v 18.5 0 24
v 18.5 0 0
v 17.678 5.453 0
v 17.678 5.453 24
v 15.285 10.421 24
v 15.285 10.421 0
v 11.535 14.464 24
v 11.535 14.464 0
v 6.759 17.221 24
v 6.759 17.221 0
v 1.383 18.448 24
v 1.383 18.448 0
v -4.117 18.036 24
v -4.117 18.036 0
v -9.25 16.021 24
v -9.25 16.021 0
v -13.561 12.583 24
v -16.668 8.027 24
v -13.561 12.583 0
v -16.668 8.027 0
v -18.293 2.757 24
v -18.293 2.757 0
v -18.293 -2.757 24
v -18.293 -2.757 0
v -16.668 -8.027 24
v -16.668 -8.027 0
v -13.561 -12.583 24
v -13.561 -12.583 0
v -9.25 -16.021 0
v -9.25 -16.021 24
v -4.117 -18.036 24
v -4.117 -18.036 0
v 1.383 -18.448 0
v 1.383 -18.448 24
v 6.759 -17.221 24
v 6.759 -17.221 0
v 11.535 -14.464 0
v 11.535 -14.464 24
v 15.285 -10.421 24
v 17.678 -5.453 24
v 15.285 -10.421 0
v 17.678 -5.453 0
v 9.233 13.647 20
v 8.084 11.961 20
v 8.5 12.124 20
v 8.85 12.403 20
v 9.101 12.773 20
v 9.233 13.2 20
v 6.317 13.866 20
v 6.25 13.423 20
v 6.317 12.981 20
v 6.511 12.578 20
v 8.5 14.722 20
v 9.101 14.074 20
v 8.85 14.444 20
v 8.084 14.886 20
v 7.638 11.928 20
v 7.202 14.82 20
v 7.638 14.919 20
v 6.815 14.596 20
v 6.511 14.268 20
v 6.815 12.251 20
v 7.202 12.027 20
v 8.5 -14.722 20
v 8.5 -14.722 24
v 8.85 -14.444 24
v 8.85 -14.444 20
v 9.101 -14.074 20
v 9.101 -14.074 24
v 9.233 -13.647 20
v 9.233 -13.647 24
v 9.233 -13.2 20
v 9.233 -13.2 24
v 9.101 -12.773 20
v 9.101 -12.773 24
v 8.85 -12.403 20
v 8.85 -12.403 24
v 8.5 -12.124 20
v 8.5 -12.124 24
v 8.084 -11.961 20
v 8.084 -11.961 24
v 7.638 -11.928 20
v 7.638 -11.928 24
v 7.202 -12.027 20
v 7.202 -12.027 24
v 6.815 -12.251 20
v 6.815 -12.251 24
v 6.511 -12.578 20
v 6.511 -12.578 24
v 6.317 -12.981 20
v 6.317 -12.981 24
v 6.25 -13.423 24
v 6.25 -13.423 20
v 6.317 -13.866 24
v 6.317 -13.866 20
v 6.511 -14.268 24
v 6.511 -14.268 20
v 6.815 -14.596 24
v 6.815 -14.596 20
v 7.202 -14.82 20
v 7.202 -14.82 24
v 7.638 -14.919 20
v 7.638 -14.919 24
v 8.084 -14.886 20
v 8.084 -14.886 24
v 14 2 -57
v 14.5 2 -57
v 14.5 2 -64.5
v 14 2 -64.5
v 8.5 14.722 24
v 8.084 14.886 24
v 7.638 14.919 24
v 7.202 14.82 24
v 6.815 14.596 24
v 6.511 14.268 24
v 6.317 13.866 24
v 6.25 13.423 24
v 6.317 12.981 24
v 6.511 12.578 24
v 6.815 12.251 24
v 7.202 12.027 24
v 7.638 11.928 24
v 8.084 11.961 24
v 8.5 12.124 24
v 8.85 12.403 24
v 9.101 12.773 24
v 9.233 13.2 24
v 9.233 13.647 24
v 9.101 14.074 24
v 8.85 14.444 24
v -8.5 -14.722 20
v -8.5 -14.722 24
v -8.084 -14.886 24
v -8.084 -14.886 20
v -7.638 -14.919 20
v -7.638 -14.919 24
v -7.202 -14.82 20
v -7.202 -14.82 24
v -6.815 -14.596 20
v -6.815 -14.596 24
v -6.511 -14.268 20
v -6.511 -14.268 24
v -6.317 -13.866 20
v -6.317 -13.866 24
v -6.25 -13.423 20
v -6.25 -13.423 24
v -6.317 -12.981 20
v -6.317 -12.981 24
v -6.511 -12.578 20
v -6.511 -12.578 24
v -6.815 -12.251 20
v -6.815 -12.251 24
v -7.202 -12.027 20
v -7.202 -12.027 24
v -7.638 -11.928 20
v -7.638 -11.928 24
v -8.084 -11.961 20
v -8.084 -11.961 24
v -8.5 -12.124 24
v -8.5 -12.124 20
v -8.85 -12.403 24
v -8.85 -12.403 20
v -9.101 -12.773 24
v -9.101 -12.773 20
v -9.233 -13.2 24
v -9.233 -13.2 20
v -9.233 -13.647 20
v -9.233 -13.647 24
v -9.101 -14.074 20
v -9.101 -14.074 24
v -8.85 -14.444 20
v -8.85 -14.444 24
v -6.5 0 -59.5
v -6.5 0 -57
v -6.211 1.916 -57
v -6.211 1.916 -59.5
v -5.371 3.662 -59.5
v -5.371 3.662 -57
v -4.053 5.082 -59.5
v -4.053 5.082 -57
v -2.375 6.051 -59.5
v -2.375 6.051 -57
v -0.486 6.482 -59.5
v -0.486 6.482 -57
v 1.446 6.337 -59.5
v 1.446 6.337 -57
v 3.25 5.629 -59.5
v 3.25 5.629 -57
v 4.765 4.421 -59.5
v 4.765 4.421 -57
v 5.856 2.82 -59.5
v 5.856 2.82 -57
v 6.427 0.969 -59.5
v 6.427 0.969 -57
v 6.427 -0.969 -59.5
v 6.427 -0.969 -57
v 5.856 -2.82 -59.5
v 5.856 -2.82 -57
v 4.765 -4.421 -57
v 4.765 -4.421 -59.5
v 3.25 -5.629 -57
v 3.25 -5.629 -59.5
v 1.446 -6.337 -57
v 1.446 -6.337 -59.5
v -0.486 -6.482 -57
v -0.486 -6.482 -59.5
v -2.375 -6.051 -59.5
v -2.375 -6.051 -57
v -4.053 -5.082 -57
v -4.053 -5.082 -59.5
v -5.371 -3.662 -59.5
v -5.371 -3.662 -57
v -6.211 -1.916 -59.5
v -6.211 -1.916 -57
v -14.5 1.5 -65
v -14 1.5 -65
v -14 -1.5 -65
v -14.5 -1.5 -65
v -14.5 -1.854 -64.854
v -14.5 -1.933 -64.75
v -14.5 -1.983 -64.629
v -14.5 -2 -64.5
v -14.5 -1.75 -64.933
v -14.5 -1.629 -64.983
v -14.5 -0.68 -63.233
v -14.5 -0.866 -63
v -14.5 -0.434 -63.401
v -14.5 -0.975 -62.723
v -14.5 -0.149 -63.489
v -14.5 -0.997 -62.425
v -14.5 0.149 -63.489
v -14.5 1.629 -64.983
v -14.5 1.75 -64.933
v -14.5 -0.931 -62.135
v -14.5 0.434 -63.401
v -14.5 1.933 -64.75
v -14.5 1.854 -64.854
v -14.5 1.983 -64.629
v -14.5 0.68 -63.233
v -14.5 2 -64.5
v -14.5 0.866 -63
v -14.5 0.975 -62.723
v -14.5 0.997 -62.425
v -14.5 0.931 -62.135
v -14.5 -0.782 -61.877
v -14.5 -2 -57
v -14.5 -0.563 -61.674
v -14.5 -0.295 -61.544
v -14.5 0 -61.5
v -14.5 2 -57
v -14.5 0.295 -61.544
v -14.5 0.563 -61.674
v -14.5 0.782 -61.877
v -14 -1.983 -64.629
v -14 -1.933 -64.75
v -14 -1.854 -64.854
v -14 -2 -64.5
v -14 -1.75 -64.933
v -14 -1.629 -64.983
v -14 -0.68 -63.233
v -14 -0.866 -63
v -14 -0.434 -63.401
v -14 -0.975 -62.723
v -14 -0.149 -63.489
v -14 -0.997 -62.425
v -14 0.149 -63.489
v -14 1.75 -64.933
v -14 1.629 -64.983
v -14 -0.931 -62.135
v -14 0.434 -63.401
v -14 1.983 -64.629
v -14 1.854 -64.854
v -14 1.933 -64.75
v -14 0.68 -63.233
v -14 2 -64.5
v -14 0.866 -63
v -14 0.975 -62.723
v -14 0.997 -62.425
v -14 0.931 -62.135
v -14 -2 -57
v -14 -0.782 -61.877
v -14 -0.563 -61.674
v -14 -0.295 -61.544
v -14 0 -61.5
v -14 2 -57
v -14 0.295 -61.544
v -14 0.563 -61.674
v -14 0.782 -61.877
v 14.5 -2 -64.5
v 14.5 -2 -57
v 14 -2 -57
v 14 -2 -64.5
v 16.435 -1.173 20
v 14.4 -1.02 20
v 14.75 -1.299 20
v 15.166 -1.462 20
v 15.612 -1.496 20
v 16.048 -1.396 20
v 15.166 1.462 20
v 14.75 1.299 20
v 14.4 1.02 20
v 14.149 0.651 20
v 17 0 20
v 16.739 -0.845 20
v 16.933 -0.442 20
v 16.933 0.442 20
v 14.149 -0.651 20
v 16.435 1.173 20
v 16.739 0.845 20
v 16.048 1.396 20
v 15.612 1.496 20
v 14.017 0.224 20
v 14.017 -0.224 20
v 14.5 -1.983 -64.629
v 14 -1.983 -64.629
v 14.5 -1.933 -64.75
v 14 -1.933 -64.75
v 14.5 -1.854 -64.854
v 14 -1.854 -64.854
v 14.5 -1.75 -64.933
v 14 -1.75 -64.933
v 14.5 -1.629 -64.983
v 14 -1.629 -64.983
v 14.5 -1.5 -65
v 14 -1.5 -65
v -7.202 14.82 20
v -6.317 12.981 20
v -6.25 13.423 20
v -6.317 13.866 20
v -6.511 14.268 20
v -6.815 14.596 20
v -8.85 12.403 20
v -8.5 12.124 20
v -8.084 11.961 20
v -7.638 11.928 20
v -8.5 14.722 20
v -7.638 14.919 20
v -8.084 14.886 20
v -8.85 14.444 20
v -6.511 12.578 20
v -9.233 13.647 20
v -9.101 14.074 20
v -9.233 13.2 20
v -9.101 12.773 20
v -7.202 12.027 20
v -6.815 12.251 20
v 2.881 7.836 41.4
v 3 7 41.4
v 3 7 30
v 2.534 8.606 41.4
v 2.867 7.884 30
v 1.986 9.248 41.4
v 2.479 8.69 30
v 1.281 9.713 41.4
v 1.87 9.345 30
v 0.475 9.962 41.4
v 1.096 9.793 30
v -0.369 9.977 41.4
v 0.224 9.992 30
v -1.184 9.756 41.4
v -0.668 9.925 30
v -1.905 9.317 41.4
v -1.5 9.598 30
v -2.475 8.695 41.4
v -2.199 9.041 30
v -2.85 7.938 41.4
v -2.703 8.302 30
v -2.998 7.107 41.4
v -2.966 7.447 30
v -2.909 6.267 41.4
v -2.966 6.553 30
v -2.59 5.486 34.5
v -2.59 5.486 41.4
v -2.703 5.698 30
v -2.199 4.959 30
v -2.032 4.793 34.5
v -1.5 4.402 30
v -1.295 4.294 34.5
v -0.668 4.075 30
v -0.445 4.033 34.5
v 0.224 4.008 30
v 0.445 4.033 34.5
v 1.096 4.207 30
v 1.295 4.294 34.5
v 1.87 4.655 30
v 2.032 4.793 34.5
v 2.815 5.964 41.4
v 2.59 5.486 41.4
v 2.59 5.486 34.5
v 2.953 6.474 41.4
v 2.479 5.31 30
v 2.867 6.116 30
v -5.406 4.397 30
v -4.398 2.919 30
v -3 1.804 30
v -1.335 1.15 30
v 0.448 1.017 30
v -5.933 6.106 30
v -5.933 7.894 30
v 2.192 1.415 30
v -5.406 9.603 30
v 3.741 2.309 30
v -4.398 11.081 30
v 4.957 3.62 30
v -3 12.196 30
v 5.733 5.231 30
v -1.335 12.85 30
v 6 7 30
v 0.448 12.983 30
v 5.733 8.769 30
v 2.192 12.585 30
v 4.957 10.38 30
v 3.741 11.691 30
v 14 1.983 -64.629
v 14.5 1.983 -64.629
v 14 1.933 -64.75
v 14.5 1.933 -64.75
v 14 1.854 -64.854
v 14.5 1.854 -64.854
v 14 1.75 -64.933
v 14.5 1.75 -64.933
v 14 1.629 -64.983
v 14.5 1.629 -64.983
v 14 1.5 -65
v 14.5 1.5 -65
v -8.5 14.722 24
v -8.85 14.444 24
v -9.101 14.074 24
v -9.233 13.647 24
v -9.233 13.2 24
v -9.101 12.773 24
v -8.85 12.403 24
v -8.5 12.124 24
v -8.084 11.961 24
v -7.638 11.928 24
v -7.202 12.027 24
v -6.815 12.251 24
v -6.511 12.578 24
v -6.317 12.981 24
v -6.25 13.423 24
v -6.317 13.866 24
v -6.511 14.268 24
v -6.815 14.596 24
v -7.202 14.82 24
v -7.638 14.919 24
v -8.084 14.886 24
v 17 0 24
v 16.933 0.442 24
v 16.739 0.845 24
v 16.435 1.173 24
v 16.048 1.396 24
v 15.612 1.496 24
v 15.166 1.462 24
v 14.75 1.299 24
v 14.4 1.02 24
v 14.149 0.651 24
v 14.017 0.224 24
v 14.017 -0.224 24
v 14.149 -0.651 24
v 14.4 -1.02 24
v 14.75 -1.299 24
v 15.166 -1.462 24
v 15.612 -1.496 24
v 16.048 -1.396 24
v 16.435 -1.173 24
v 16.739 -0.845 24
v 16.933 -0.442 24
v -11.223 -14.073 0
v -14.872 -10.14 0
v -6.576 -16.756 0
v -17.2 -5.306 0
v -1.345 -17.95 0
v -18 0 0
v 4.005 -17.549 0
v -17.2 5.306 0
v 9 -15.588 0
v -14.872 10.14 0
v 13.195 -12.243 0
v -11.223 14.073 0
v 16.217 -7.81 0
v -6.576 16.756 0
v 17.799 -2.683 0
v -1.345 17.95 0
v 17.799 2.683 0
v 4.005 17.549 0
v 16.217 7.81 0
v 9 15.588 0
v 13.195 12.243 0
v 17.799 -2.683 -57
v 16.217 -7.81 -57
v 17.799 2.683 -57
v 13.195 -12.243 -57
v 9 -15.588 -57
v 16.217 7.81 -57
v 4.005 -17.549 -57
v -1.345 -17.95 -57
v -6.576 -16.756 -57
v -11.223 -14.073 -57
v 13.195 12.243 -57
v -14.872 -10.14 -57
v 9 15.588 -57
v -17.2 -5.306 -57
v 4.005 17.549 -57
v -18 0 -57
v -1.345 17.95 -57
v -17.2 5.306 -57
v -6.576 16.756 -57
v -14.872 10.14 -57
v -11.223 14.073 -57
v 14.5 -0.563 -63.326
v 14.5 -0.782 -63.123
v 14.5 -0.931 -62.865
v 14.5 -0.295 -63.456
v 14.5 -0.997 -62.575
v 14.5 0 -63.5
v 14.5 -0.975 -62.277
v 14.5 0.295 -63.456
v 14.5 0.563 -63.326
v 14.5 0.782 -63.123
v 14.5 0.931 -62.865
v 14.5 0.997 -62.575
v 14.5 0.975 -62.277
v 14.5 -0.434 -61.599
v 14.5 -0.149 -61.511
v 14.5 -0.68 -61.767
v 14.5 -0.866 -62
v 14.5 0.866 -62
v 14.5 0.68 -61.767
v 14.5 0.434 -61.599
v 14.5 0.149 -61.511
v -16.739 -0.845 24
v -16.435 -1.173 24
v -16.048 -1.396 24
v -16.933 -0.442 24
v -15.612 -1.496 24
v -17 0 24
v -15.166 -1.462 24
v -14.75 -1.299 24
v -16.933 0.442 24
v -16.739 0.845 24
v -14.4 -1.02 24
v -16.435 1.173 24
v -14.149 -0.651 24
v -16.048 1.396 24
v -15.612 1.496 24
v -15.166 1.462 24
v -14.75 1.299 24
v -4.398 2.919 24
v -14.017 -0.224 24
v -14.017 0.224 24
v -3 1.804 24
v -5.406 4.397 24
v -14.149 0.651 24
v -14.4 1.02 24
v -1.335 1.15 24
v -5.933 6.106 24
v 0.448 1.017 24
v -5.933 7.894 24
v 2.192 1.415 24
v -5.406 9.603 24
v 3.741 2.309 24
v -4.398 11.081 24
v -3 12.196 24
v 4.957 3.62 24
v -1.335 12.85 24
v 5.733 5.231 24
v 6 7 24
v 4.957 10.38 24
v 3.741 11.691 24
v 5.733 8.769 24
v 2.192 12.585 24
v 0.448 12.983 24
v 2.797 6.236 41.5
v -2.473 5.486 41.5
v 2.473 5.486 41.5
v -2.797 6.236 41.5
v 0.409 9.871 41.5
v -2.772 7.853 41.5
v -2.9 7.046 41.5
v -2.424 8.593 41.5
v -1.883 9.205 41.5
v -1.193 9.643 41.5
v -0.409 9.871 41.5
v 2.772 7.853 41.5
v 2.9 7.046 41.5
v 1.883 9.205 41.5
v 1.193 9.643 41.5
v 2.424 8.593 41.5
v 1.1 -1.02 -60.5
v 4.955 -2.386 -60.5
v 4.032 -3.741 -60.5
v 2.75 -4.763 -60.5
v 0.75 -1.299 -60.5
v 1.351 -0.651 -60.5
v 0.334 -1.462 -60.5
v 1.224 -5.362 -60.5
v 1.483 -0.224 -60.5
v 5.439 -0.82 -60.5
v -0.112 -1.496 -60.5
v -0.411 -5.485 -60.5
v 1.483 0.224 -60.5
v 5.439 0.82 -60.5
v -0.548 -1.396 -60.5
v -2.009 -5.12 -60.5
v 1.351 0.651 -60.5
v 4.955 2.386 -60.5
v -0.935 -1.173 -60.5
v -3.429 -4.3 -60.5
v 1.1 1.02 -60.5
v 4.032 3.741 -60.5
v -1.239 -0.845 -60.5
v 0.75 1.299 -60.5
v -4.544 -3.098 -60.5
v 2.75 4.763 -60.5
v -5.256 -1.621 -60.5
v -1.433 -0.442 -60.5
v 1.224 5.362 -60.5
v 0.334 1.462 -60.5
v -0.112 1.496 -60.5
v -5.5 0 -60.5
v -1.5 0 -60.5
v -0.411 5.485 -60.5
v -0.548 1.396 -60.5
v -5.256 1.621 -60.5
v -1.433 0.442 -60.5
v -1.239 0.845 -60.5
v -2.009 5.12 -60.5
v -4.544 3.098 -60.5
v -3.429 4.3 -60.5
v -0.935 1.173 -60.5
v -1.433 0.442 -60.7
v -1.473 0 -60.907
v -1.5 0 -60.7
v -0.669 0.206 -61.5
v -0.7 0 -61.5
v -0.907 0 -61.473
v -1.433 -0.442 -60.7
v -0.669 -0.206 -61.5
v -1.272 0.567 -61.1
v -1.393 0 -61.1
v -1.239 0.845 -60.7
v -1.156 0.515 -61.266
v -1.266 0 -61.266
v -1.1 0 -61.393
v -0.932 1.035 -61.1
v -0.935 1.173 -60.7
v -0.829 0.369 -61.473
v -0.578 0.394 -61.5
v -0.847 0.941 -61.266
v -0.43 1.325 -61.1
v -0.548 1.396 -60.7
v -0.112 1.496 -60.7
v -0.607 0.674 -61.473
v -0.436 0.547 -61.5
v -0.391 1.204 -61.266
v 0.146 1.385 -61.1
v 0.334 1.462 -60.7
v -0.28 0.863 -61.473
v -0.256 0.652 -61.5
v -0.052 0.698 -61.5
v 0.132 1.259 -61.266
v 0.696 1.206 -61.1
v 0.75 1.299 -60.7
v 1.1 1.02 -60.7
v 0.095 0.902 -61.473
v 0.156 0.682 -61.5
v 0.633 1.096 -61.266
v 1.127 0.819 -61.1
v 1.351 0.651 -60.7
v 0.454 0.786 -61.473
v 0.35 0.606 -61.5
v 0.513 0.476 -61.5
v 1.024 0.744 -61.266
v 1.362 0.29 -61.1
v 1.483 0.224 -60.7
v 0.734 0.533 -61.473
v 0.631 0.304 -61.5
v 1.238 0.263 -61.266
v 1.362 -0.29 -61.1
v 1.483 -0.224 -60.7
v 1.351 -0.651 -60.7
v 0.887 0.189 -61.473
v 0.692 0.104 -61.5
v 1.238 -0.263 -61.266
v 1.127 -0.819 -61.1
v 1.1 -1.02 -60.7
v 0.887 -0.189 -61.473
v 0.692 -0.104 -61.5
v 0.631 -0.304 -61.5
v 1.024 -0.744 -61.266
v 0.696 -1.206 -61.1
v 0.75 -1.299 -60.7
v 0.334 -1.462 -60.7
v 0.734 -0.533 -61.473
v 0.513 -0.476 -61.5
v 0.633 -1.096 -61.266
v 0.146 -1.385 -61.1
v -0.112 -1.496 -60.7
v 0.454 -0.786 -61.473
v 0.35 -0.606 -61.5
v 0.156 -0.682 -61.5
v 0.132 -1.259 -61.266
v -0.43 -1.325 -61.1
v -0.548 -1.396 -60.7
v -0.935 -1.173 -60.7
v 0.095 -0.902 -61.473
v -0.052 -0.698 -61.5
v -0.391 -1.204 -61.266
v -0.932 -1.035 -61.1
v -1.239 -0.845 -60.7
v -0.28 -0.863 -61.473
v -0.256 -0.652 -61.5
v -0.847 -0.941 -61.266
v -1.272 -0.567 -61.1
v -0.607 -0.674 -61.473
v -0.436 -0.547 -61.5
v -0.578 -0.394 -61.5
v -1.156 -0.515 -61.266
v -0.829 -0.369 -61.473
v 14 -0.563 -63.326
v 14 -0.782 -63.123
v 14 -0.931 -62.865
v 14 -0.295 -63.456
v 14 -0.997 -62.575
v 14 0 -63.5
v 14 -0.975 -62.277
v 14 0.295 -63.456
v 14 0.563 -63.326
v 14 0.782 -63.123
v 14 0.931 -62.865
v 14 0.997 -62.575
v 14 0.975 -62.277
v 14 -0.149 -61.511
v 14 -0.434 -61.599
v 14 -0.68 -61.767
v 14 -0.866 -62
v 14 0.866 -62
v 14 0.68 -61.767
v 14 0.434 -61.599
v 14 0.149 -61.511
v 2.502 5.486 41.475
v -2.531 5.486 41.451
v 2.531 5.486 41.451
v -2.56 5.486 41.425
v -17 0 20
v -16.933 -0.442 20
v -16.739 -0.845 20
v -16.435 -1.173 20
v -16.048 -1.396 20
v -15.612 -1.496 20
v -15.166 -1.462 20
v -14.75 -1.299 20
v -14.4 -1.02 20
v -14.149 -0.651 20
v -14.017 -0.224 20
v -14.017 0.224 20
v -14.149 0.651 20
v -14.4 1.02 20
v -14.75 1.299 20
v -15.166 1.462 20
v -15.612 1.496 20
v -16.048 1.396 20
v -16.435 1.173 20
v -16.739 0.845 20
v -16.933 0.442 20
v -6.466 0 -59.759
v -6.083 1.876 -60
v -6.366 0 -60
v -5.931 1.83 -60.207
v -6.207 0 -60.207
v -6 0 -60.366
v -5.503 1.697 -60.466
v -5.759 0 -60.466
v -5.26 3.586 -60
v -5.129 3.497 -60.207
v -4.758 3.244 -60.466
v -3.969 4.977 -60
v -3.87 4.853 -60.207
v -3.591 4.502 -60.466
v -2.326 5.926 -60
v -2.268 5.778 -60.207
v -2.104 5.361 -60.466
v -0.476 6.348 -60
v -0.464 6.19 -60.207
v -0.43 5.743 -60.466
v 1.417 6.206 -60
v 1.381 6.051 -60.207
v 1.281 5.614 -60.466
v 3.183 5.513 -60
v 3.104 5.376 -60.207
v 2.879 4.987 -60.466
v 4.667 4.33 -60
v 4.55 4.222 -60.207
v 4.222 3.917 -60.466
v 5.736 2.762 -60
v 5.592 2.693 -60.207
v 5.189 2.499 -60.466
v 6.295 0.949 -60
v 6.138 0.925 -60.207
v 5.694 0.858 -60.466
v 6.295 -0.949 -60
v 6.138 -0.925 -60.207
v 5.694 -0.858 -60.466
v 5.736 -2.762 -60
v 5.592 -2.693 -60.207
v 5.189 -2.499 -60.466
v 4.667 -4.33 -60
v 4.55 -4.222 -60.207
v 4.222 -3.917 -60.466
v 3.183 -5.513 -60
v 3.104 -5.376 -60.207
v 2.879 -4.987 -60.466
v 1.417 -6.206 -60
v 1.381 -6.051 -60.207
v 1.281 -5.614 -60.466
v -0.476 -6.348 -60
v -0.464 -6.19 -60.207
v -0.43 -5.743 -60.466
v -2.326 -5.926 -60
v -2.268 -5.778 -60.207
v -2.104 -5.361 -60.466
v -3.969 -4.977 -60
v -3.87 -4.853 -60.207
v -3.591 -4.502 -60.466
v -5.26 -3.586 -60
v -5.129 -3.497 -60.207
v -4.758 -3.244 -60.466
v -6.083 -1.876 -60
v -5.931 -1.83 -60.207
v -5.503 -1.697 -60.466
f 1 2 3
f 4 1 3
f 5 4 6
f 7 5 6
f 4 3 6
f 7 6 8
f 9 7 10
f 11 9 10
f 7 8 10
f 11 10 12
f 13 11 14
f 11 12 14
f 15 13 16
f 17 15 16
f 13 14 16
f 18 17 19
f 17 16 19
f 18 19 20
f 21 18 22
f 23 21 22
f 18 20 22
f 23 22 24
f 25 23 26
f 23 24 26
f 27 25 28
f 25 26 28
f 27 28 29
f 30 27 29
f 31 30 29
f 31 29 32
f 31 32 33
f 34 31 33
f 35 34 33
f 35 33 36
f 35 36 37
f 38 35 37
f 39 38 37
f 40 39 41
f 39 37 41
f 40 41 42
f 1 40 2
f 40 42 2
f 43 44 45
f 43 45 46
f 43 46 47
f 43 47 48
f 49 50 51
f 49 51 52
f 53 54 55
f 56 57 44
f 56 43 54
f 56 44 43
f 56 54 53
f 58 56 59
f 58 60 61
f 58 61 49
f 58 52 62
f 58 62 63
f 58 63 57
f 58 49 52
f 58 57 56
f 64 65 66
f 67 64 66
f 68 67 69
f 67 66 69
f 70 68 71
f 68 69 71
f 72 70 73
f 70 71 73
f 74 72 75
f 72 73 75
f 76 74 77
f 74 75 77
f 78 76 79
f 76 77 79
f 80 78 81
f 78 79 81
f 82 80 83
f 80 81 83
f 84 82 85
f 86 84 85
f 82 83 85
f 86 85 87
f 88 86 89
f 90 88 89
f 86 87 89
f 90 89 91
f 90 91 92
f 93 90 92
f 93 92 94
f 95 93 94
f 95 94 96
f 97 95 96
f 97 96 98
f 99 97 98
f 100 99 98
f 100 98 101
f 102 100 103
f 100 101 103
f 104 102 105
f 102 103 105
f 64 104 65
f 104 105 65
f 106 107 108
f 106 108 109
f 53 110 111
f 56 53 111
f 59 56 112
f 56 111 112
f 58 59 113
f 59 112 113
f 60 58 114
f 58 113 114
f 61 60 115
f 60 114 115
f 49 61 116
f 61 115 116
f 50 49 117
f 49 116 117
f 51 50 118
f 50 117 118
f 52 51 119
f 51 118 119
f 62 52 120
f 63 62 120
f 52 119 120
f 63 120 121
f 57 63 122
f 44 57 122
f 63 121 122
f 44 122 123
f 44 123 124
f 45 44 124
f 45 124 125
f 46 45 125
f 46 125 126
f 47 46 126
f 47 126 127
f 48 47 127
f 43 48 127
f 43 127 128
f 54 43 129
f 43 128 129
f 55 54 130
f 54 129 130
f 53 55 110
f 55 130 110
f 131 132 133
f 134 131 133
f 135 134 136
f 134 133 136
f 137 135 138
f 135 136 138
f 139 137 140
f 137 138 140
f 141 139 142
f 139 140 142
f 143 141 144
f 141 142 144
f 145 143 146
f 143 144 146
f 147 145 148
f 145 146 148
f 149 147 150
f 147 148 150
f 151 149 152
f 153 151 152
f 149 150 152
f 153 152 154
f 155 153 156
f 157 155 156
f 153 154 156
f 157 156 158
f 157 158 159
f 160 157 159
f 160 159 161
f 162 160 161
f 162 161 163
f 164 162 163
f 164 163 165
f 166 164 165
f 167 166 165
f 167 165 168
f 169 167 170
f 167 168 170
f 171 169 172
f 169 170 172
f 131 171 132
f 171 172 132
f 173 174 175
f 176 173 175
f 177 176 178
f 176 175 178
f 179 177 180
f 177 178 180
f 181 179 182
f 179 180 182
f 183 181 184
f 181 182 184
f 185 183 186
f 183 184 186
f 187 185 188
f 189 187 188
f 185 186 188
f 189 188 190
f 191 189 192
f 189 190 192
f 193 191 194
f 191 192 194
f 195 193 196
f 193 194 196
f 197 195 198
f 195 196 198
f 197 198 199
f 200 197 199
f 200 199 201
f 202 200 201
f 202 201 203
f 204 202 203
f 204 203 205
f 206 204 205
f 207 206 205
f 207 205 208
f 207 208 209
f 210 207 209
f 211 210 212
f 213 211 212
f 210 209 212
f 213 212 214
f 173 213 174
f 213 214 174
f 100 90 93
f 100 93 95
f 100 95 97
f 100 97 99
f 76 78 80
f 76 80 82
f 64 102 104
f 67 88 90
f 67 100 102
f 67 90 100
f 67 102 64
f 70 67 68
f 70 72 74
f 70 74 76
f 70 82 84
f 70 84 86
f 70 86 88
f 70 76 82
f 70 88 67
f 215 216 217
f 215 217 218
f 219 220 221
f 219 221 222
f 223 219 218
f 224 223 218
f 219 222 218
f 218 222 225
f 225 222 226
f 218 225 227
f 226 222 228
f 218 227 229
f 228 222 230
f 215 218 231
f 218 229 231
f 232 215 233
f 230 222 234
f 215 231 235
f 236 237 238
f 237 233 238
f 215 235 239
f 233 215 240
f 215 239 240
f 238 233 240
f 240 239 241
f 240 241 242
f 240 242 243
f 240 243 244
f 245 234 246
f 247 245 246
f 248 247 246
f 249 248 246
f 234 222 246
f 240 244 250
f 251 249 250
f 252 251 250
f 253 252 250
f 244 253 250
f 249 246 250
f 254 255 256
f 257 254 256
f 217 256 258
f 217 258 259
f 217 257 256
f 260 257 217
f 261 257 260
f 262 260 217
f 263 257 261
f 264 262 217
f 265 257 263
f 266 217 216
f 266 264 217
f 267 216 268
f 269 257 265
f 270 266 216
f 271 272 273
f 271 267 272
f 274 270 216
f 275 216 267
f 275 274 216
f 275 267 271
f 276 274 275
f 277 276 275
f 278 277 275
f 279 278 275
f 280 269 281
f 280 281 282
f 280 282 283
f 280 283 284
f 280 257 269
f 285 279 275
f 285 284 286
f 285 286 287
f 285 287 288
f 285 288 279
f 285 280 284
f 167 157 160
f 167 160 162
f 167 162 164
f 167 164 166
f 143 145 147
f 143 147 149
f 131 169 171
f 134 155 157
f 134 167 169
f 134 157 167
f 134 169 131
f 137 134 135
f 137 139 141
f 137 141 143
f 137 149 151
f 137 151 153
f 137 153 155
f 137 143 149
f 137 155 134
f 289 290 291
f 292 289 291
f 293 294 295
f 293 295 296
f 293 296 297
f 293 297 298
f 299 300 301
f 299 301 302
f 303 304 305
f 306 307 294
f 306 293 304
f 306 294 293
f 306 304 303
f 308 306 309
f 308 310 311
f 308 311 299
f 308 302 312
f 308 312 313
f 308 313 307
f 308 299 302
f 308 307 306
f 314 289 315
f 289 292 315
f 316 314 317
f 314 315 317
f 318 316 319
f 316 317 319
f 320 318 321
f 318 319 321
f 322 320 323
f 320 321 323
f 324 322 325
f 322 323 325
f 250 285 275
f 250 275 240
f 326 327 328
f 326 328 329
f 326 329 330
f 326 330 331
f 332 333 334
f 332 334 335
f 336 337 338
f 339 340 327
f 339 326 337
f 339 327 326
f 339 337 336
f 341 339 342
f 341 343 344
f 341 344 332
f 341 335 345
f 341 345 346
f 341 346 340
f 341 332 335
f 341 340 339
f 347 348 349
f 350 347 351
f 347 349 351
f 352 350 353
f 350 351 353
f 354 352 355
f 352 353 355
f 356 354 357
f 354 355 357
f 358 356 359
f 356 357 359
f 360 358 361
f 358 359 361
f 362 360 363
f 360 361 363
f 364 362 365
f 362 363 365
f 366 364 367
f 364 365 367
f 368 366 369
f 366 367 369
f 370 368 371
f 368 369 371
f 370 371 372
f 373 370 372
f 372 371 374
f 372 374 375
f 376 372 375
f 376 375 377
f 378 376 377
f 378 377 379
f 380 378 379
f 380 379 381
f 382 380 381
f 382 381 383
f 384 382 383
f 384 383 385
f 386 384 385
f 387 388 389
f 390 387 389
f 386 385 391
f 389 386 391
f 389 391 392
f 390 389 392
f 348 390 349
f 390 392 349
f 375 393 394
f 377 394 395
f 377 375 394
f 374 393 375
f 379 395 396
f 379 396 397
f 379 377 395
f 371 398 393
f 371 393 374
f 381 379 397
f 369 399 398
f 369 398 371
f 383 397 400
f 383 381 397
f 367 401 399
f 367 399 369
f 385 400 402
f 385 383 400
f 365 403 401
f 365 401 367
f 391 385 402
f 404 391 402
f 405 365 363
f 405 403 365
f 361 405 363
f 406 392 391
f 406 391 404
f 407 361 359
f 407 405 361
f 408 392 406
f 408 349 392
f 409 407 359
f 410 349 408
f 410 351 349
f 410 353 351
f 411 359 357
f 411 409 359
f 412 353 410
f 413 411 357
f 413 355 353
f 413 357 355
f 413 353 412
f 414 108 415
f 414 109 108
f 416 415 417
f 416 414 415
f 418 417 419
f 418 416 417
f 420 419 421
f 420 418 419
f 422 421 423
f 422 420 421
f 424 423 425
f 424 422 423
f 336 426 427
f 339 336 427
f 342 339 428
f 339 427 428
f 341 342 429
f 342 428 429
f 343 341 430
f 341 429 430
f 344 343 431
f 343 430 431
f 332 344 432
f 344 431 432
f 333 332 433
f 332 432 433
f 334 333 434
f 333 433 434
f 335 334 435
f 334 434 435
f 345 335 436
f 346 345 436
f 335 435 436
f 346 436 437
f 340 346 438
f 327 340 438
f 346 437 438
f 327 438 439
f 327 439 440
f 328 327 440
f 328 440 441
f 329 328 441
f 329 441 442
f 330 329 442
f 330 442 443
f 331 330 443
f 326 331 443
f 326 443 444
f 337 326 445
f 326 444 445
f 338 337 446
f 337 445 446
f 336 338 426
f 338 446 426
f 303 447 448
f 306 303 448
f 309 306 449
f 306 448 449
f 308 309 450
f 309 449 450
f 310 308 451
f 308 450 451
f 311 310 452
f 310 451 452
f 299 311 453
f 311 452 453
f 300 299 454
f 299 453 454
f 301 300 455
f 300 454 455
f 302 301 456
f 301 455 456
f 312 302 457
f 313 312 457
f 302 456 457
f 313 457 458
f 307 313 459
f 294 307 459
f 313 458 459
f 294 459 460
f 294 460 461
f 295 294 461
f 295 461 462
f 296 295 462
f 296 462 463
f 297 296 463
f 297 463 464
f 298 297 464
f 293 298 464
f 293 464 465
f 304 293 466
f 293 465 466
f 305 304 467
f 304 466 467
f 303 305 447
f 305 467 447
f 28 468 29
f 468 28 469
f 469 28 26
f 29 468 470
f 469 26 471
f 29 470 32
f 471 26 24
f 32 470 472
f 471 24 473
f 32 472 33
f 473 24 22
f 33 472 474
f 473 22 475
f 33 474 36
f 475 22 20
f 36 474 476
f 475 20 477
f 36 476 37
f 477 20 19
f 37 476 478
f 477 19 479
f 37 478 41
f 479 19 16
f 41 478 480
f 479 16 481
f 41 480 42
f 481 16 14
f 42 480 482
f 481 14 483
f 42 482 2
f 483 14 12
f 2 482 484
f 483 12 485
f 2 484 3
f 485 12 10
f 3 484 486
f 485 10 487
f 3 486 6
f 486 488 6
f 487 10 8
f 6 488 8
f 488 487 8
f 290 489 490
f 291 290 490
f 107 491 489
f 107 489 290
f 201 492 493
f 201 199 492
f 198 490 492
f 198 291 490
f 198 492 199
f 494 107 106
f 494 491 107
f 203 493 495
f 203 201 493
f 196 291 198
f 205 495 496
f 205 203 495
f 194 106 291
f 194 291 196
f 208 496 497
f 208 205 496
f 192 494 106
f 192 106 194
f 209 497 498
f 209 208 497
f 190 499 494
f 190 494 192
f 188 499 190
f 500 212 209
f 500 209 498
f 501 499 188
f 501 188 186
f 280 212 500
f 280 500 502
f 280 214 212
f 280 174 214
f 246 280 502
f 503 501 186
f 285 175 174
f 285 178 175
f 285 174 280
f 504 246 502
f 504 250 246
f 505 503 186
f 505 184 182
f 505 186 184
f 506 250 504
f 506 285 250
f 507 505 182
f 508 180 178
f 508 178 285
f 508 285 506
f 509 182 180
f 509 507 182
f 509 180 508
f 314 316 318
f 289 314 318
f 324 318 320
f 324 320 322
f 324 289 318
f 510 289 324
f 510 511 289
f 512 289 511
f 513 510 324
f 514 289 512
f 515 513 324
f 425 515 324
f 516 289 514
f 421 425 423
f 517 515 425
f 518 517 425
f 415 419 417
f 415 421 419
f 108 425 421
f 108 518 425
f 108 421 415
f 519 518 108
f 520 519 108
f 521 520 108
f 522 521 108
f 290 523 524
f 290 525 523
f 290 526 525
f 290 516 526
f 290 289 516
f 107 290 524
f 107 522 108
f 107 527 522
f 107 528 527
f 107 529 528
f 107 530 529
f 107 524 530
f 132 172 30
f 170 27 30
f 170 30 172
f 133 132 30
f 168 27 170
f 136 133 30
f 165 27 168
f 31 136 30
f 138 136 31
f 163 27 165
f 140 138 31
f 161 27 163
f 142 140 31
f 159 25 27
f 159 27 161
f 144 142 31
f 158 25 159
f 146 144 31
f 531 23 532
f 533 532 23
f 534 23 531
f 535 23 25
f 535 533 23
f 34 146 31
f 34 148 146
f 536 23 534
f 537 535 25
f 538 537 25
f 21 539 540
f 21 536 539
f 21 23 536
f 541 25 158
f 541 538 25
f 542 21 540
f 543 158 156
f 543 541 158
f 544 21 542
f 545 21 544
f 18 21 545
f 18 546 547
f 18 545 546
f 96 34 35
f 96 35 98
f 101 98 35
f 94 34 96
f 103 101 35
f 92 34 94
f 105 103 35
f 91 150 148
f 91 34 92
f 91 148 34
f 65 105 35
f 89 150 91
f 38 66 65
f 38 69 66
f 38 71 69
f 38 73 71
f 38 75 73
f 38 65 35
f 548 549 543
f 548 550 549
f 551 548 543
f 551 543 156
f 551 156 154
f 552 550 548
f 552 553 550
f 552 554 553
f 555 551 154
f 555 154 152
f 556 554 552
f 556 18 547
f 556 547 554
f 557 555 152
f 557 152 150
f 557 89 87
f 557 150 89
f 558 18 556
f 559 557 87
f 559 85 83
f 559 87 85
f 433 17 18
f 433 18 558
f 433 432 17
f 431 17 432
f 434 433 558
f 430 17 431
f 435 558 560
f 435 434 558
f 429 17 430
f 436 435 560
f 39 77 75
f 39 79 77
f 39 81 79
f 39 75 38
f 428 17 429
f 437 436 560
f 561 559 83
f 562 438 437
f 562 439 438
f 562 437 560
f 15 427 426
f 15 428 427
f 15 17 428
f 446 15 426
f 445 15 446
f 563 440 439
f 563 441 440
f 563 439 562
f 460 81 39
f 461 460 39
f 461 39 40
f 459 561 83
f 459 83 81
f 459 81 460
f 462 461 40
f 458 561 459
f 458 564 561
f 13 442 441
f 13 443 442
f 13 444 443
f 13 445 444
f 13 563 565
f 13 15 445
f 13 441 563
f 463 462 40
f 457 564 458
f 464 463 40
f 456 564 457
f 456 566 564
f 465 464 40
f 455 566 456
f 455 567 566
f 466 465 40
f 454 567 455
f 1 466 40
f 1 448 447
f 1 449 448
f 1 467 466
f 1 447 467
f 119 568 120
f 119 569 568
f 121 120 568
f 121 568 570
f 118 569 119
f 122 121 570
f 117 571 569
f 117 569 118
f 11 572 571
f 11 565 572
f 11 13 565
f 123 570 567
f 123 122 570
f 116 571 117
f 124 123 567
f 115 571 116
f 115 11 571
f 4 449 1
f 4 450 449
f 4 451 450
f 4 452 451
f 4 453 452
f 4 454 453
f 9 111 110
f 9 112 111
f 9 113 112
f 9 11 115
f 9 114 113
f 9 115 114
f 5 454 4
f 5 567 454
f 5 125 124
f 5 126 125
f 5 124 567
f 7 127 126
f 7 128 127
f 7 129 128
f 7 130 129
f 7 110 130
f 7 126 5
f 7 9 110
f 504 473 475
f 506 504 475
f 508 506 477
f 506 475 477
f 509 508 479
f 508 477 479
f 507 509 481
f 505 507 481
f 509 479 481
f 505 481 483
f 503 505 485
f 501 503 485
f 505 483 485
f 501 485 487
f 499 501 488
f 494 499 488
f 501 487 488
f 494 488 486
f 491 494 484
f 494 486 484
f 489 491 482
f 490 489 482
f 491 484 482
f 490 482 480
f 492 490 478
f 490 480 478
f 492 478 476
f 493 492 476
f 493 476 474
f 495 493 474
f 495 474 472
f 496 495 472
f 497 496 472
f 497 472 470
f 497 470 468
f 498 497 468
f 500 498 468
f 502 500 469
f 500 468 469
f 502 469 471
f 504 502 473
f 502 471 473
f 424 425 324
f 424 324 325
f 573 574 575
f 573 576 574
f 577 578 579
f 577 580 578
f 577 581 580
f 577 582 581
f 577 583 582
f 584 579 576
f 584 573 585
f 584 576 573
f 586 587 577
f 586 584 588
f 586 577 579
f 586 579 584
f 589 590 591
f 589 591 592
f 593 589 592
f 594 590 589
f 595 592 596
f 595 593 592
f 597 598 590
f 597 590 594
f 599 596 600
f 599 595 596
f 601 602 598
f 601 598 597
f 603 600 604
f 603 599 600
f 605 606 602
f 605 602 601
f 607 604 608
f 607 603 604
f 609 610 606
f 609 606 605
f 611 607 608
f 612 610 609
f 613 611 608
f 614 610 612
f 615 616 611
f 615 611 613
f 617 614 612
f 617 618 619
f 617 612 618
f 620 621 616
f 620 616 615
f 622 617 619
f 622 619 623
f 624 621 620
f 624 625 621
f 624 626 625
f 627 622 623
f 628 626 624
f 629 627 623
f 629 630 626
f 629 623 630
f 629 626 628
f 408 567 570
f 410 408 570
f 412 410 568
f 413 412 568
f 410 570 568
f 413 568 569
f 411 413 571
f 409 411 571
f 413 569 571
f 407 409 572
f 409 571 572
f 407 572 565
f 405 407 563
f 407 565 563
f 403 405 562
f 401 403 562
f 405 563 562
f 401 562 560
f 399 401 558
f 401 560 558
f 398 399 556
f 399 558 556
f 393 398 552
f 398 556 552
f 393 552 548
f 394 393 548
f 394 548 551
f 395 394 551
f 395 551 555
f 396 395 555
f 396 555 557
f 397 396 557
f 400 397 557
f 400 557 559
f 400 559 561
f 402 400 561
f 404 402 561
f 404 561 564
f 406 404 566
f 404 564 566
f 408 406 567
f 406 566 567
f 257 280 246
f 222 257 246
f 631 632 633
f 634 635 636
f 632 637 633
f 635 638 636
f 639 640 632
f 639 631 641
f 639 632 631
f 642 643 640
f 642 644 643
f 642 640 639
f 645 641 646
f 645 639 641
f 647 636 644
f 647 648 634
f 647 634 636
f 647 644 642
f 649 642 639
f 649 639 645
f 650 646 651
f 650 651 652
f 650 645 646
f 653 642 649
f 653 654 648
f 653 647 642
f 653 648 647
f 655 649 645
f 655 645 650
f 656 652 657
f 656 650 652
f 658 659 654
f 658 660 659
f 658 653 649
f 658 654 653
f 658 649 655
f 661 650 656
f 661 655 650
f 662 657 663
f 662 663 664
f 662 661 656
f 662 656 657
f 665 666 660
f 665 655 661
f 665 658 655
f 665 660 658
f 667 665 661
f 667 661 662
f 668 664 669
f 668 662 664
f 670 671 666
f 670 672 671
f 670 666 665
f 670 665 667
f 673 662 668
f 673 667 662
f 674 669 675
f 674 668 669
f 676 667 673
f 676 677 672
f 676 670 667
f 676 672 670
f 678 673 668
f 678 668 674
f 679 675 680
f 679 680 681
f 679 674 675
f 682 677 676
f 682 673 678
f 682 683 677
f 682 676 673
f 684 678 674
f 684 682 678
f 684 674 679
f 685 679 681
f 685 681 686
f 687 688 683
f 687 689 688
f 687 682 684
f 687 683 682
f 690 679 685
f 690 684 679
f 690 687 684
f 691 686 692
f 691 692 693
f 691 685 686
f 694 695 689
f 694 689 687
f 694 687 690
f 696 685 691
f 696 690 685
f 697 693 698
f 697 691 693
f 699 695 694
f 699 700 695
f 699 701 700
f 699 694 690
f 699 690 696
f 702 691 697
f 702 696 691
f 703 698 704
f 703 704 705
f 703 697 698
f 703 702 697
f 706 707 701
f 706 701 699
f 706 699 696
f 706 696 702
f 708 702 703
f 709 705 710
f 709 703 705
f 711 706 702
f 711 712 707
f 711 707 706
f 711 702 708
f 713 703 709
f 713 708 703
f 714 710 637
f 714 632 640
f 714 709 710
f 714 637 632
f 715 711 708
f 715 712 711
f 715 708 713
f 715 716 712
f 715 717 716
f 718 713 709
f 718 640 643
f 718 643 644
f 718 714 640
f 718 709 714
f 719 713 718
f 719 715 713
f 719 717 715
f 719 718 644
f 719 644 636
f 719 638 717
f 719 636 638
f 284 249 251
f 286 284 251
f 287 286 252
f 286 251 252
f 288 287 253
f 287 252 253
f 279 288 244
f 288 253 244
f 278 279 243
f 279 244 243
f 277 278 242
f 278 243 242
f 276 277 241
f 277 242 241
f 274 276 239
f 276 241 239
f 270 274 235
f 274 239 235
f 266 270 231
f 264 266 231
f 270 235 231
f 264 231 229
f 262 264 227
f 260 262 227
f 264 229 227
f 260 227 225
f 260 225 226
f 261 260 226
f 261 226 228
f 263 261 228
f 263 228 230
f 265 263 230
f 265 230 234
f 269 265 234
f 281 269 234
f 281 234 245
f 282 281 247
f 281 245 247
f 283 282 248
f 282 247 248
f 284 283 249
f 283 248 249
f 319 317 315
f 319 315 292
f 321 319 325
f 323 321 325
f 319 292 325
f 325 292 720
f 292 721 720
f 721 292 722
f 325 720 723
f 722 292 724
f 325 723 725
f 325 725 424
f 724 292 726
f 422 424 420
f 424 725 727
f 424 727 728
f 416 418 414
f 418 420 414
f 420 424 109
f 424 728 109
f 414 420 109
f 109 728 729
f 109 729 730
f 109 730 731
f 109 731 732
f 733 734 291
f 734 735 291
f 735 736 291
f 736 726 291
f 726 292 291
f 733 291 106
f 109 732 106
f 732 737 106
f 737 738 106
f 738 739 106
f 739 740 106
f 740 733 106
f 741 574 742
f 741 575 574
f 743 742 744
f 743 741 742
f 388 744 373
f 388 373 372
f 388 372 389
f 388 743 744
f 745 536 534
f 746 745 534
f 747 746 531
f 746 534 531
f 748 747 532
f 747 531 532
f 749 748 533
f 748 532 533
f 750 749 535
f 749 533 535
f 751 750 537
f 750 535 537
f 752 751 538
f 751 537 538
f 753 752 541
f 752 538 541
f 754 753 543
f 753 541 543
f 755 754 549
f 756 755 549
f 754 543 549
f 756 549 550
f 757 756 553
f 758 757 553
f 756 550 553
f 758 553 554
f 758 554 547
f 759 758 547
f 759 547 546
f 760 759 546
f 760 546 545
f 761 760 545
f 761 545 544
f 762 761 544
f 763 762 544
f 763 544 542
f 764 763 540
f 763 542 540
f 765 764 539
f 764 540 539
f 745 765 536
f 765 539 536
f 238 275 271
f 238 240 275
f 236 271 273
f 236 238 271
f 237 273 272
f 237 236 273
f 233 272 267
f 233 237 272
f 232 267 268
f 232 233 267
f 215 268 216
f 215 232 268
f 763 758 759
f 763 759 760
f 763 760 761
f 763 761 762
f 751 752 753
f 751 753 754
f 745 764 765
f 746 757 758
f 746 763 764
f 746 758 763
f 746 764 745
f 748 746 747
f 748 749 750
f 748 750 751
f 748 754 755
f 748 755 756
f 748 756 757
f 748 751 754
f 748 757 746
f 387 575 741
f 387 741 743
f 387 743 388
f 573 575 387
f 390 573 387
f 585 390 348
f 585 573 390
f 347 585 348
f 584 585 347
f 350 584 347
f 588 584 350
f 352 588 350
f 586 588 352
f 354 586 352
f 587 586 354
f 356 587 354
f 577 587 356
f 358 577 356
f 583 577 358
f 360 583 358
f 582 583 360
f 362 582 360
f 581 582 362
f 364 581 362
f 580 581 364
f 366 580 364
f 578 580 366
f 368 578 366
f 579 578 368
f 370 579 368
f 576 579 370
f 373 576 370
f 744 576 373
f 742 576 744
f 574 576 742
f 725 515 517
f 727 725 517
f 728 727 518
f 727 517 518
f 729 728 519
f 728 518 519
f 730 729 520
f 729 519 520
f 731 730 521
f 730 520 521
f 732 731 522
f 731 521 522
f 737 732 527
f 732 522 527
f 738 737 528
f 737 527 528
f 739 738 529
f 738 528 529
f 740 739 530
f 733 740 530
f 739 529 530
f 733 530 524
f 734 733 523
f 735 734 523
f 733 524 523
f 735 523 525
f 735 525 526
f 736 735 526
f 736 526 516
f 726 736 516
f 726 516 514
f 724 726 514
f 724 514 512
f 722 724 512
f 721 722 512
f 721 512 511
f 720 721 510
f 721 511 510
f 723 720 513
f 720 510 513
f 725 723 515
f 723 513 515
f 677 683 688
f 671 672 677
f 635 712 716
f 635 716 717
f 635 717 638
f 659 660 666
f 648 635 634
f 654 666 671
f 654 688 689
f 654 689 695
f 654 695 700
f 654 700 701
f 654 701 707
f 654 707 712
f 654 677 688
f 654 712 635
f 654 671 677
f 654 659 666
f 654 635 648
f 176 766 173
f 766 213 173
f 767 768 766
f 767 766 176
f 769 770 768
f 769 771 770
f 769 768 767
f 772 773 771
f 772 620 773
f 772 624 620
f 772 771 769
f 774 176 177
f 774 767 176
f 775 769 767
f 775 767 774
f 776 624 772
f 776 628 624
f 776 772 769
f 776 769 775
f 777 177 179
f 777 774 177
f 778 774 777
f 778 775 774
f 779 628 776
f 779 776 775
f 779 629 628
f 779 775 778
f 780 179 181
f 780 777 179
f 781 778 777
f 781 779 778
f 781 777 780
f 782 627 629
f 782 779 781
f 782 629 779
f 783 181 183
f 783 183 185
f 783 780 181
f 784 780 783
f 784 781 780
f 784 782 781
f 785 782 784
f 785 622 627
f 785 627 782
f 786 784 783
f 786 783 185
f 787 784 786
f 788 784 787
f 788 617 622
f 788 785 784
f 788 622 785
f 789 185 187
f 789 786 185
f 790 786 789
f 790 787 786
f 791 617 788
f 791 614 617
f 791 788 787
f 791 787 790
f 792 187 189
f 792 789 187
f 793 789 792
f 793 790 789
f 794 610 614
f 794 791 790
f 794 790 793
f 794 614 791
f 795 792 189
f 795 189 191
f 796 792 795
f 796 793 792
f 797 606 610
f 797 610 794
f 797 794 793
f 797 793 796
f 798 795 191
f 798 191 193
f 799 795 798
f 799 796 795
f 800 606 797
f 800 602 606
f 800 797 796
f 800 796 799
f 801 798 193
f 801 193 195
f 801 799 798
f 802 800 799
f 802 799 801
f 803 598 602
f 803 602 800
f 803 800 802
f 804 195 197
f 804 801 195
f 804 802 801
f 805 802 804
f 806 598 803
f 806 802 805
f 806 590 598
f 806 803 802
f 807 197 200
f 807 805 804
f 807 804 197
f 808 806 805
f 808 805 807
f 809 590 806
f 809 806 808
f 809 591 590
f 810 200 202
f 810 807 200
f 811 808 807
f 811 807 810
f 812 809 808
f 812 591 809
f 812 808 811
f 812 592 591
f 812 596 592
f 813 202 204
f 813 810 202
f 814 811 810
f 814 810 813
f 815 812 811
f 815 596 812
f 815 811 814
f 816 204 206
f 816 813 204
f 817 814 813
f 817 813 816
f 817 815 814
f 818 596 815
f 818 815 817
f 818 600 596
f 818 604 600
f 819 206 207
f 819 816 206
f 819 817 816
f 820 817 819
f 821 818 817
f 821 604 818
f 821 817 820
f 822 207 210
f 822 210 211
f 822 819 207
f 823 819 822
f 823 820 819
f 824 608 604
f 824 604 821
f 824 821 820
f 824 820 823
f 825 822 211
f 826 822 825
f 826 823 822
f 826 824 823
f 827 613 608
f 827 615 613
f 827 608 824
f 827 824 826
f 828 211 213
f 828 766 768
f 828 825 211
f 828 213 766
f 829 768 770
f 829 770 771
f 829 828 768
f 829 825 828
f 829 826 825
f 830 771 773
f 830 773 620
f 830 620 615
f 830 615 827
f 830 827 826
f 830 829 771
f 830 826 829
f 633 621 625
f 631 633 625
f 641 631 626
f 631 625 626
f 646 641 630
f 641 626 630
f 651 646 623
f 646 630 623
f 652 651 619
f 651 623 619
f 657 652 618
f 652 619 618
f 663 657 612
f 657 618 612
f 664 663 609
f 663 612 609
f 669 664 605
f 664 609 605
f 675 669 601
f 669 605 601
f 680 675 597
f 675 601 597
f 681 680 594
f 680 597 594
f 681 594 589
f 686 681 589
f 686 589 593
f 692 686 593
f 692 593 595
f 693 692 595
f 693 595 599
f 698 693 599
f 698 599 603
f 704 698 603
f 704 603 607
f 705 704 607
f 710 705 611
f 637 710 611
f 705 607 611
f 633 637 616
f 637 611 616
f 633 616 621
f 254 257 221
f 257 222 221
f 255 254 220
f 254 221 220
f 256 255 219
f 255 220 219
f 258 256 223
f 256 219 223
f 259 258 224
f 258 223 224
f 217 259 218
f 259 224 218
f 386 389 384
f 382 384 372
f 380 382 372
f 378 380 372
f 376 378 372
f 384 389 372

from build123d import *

# Parameters (mm, degrees)
SKETCH_1_R               = 18.5
EXTRUDE_1_DEPTH          = 24
SKETCH_2_R               = 6
EXTRUDE_2_DEPTH          = 6
SKETCH_3_R               = 1.5
CUT_EXTRUDE_1_DEPTH      = 4
SKETCH_4_R               = 3
EXTRUDE_3_DEPTH          = 11.5
CHAMFER_1_SIZE           = 0.1
CUT_EXTRUDE_START        = -7
CUT_EXTRUDE_2_DEPTH      = 7
PATTERN_CIRCULAR_1_COUNT = 6
SKETCH_6_R               = 18
EXTRUDE_4_DEPTH          = 57
SKETCH_7_R               = 6.5
EXTRUDE_5_DEPTH          = 3.5
FILLET_1_R               = 1
SKETCH_8_R               = 1.5
EXTRUDE_6_DEPTH          = 1
SKETCH_9_W               = 0.5
SKETCH_9_H               = 4
EXTRUDE_7_DEPTH          = 8
FILLET_2_R               = 0.5
SKETCH_10_R              = 1
CUT_EXTRUDE_3_DEPTH      = 0.5
CUT_EXTRUDE_START_2      = -0.5
SKETCH_11_R              = 1
CUT_EXTRUDE_4_DEPTH      = 0.5
FILLET_3_R               = 0.8


with BuildPart() as part:
    # 草图1 → 凸台-拉伸1 (new body)
    with BuildSketch(Plane.XY):
        Circle(SKETCH_1_R)
    extrude(amount=EXTRUDE_1_DEPTH)

    # 草图2 → 凸台-拉伸2 (add)
    with BuildSketch(Plane.XY.offset(24)):
        with Locations((0, 7)):
            Circle(SKETCH_2_R)
    extrude(amount=EXTRUDE_2_DEPTH)

    # 草图3 → 切除-拉伸1 (cut)
    with BuildSketch(Plane.XY.offset(24)):
        with Locations((15.5, 0)):
            Circle(SKETCH_3_R)
    cut_extrude_1 = extrude(amount=-CUT_EXTRUDE_1_DEPTH, mode=Mode.SUBTRACT)

    # 草图4 → 凸台-拉伸3 (add)
    with BuildSketch(Plane.XY.offset(30)):
        with Locations((0, 7)):
            Circle(SKETCH_4_R)
    extrude(amount=EXTRUDE_3_DEPTH)

    # 倒角1
    chamfer_1_edges = [part.edges().sort_by_distance(p)[0] for p in [
        (-3, 7, 41.5),
    ]]
    chamfer(chamfer_1_edges, length=CHAMFER_1_SIZE)

    # 草图5 → 切除-拉伸2 (cut)
    with BuildSketch(Plane.XY.offset(41.5).offset(CUT_EXTRUDE_START)):
        with BuildLine():
            Line((-2.589731968, 5.485639298), (2.589731968, 5.485639298))
            ThreePointArc((2.589731968, 5.485639298), (0, 4), (-2.589731968, 5.485639298))
        make_face()
    extrude(amount=CUT_EXTRUDE_2_DEPTH, mode=Mode.SUBTRACT)

    # 阵列(圆周)1: 切除-拉伸1 ×6 about axis
    pattern_circular_1_axis = Axis((0, 0, 47.25), (0, 0, -1))
    for i in range(1, PATTERN_CIRCULAR_1_COUNT):
        add(cut_extrude_1.rotate(pattern_circular_1_axis, i * 360 / PATTERN_CIRCULAR_1_COUNT), mode=Mode.SUBTRACT)

    # 草图6 → 凸台-拉伸4 (add)
    with BuildSketch(Plane(origin=(0, 0, 0), x_dir=(-1, 0, 0), z_dir=(0, 0, -1))):
        Circle(SKETCH_6_R)
    extrude(amount=EXTRUDE_4_DEPTH)

    # 草图7 → 凸台-拉伸5 (add)
    with BuildSketch(Plane(origin=(0, 0, -57), x_dir=(-1, 0, 0), z_dir=(0, 0, -1))):
        Circle(SKETCH_7_R)
    extrude(amount=EXTRUDE_5_DEPTH)

    # 圆角1
    fillet_1_edges = [part.edges().sort_by_distance(p)[0] for p in [
        (6.5, 0, -60.5),
    ]]
    fillet(fillet_1_edges, radius=FILLET_1_R)

    # 草图8 → 凸台-拉伸6 (add)
    with BuildSketch(Plane(origin=(0, 0, -60.5), x_dir=(-1, 0, 0), z_dir=(0, 0, -1))):
        Circle(SKETCH_8_R)
    extrude(amount=EXTRUDE_6_DEPTH)

    # 草图9 → 凸台-拉伸7 (add)
    with BuildSketch(Plane(origin=(0, 0, -57), x_dir=(-1, 0, 0), z_dir=(0, 0, -1))):
        with Locations((14.25, 0)):
            Rectangle(SKETCH_9_W, SKETCH_9_H)
        with Locations((-14.25, 0)):
            Rectangle(SKETCH_9_W, SKETCH_9_H)
    extrude(amount=EXTRUDE_7_DEPTH)

    # 圆角2
    fillet_2_edges = [part.edges().sort_by_distance(p)[0] for p in [
        (14.25, 2, -65),
        (14.25, -2, -65),
        (-14.25, -2, -65),
        (-14.25, 2, -65),
    ]]
    fillet(fillet_2_edges, radius=FILLET_2_R)

    # 草图10 → 切除-拉伸3 (cut)
    with BuildSketch(Plane.ZY.offset(14.5)):
        with Locations((-62.5, 0)):
            Circle(SKETCH_10_R)
    extrude(amount=-CUT_EXTRUDE_3_DEPTH, mode=Mode.SUBTRACT)

    # 草图11 → 切除-拉伸4 (cut)
    with BuildSketch(Plane(origin=(14.5, 0, 0), x_dir=(0, 0, -1), z_dir=(1, 0, 0)).offset(CUT_EXTRUDE_START_2)):
        with Locations((62.5, 0)):
            Circle(SKETCH_11_R)
    extrude(amount=CUT_EXTRUDE_4_DEPTH, mode=Mode.SUBTRACT)

    # 圆角3
    fillet_3_edges = [part.edges().sort_by_distance(p)[0] for p in [
        (1.5, 0, -61.5),
    ]]
    fillet(fillet_3_edges, radius=FILLET_3_R)


solid = part.part
